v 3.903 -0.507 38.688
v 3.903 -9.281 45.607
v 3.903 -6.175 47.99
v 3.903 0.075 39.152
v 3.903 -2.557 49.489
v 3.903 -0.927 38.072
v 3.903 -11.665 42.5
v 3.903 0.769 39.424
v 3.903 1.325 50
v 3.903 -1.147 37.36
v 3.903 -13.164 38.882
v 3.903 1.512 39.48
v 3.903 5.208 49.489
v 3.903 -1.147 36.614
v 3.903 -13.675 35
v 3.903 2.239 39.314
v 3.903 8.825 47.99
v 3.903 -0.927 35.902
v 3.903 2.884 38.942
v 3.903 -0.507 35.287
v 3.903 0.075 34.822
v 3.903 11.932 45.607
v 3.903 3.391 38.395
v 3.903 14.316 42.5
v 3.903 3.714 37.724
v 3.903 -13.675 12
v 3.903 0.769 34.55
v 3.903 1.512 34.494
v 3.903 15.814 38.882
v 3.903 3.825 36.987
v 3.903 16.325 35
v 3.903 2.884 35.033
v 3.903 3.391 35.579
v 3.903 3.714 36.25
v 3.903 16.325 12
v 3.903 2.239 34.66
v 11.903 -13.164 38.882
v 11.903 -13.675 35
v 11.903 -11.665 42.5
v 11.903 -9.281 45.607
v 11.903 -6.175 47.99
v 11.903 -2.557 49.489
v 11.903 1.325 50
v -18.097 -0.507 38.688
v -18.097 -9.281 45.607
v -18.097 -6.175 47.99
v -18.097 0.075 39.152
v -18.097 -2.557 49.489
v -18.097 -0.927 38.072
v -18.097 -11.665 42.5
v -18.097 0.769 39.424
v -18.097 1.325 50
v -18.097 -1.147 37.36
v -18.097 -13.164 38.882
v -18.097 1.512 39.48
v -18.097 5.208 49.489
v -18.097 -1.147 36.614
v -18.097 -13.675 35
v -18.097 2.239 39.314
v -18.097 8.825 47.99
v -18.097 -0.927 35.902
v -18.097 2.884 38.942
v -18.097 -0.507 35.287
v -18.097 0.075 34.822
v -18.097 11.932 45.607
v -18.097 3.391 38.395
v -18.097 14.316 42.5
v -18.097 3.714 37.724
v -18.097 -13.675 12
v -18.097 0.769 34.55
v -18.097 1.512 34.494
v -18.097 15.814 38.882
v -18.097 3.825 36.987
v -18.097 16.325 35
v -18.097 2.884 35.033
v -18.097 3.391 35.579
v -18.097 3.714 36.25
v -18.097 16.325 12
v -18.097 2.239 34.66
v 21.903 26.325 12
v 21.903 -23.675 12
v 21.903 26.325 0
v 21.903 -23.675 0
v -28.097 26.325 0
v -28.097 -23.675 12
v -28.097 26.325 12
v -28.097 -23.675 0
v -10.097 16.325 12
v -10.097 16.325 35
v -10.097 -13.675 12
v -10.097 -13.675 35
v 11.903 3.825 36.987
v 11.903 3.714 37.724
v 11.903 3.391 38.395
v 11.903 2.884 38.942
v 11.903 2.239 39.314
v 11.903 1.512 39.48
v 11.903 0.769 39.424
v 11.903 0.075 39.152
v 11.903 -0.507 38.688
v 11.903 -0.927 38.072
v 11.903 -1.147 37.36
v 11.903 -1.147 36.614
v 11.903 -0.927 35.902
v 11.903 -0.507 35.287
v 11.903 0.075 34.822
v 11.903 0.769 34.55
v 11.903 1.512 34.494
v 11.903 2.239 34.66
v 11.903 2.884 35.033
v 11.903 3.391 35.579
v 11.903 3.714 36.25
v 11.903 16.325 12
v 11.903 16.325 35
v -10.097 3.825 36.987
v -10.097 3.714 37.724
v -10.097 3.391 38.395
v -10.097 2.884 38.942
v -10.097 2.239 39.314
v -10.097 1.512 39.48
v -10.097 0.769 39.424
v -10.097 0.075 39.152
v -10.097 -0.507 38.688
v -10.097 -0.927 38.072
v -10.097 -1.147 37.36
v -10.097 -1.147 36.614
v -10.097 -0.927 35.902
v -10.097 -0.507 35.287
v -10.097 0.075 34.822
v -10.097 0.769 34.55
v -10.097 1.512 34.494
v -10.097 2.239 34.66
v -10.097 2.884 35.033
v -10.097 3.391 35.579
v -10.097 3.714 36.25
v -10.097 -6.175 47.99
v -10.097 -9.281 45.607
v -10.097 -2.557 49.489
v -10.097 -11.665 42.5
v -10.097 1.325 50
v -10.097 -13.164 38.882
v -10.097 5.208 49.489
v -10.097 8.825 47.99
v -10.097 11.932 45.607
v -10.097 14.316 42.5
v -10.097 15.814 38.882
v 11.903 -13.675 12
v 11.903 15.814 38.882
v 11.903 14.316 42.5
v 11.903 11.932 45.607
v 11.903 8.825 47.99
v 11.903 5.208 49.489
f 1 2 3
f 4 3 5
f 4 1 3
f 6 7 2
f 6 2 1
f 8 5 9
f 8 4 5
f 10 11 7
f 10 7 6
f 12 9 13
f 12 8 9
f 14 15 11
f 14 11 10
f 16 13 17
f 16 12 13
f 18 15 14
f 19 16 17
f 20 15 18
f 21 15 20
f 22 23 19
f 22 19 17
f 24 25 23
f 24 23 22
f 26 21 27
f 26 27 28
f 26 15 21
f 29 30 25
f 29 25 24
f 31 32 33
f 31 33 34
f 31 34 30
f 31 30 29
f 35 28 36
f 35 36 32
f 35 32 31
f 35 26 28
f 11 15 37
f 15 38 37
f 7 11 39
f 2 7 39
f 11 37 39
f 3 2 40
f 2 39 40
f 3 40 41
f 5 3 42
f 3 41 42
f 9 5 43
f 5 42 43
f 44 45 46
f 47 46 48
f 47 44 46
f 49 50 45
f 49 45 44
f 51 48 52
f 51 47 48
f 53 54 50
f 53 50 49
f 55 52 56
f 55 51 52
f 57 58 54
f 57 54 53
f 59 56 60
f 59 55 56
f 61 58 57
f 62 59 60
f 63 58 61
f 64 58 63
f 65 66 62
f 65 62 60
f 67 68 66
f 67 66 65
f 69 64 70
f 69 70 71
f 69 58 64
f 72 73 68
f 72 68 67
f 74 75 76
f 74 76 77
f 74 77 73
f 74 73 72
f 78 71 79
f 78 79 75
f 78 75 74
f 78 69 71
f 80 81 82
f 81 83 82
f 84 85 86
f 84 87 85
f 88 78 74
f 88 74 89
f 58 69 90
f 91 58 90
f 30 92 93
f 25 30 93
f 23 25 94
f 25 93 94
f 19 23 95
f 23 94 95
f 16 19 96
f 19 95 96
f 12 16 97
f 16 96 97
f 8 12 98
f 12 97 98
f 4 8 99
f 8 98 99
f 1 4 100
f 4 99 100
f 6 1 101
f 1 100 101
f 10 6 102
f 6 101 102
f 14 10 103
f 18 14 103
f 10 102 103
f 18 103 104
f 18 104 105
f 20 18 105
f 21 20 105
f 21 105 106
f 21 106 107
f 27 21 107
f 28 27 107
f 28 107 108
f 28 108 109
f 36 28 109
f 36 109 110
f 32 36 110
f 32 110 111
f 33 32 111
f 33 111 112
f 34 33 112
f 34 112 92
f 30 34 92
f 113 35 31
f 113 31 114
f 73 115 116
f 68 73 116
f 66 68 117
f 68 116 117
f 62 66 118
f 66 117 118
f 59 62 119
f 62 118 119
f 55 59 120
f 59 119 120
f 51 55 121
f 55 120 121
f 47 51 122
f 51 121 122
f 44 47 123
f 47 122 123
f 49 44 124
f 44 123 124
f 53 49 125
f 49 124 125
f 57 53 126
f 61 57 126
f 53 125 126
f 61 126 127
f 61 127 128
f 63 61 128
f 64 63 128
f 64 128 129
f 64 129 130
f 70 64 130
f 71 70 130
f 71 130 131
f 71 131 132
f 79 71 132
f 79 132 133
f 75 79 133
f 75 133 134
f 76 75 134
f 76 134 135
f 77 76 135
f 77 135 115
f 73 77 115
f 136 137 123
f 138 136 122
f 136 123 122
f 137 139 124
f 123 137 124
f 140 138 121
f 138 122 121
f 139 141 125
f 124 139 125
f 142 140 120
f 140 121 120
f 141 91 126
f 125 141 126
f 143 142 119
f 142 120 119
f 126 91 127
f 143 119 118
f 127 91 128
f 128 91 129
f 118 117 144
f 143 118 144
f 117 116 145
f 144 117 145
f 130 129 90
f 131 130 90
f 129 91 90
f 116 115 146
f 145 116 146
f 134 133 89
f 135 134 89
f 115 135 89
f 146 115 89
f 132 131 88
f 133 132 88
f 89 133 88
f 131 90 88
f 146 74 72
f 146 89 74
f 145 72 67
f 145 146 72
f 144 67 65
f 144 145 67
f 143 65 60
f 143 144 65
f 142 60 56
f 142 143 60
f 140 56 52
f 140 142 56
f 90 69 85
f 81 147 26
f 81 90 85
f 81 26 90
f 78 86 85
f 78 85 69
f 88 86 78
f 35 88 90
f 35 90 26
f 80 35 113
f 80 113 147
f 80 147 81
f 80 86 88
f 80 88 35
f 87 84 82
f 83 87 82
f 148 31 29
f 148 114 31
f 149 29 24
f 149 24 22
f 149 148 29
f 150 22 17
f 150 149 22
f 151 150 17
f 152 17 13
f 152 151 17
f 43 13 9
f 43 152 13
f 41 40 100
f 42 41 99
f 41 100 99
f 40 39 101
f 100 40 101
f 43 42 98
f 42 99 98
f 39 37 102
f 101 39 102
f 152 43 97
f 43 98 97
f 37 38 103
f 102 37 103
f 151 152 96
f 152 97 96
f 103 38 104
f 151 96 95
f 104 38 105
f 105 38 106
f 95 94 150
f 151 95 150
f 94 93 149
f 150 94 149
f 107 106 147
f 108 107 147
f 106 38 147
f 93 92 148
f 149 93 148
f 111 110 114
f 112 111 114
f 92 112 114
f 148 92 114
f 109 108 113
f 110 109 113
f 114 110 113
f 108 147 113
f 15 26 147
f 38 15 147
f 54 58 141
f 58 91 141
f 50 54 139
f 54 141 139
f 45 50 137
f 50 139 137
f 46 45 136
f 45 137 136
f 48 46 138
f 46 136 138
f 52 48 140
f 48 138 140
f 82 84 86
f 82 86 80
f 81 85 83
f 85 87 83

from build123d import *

# Parameters (mm, degrees)
F0_W     = 50
F0_H     = 50
F1_DEPTH = 10
F2_W     = 8
F2_H     = 30
F4_DEPTH = 40
F3_W     = 8
F3_H     = 30
F5_DEPTH = 40
F6_R     = 14.99999
F8_D     = 5
F9_DEPTH = 2


# Not quite as in the source:
# - a fillet or chamfer is up to 0.001 mm smaller than in the source, because OpenCascade refuses the exact size


with BuildPart() as f1:
    # F0 (on Top) → F1 (new body)
    with BuildSketch(Plane.XY):
        with Locations((-3.097159788, 1.3252983437)):
            Rectangle(F0_W, F0_H)
    extrude(amount=F1_DEPTH)

    # F2 (on face) → F4 (join)
    with BuildSketch(Plane.XY.offset(10)):
        with Locations((-14.097159788, 1.3252983437)):
            Rectangle(F2_W, F2_H)
    extrude(amount=F4_DEPTH)

    # F3 (on face) → F5 (join)
    with BuildSketch(Plane.XY.offset(10)):
        with Locations((7.902840212, 1.3252983437)):
            Rectangle(F3_W, F3_H)
    extrude(amount=F5_DEPTH)

    # F6 (radius 15 in the source; OpenCascade refuses exactly that, so slightly less here)
    f6_edges = [f1.edges().sort_by_distance(p)[0] for p in [
        (7.90284, -13.674702, 50),
        (7.90284, 16.325298, 50),
        (-14.09716, -13.674702, 50),
        (-14.09716, 16.325298, 50),
    ]]
    fillet(f6_edges, radius=F6_R)

    # F8 (through all)
    with Locations(Plane(origin=(-18.097159788, 0, 0), x_dir=(0, -1, 0), z_dir=(-1, 0, 0))):
        with Locations((-1.3252983437, 36.9870997965)):
            Hole(F8_D / 2)

    # F9 (add): a face of the model
    f9_faces = [f1.faces().sort_by_distance(p)[0] for p in [
        (-3.097159788, 1.3252983437, 10),
    ]]
    extrude(f9_faces, amount=F9_DEPTH)


solid = f1.part
